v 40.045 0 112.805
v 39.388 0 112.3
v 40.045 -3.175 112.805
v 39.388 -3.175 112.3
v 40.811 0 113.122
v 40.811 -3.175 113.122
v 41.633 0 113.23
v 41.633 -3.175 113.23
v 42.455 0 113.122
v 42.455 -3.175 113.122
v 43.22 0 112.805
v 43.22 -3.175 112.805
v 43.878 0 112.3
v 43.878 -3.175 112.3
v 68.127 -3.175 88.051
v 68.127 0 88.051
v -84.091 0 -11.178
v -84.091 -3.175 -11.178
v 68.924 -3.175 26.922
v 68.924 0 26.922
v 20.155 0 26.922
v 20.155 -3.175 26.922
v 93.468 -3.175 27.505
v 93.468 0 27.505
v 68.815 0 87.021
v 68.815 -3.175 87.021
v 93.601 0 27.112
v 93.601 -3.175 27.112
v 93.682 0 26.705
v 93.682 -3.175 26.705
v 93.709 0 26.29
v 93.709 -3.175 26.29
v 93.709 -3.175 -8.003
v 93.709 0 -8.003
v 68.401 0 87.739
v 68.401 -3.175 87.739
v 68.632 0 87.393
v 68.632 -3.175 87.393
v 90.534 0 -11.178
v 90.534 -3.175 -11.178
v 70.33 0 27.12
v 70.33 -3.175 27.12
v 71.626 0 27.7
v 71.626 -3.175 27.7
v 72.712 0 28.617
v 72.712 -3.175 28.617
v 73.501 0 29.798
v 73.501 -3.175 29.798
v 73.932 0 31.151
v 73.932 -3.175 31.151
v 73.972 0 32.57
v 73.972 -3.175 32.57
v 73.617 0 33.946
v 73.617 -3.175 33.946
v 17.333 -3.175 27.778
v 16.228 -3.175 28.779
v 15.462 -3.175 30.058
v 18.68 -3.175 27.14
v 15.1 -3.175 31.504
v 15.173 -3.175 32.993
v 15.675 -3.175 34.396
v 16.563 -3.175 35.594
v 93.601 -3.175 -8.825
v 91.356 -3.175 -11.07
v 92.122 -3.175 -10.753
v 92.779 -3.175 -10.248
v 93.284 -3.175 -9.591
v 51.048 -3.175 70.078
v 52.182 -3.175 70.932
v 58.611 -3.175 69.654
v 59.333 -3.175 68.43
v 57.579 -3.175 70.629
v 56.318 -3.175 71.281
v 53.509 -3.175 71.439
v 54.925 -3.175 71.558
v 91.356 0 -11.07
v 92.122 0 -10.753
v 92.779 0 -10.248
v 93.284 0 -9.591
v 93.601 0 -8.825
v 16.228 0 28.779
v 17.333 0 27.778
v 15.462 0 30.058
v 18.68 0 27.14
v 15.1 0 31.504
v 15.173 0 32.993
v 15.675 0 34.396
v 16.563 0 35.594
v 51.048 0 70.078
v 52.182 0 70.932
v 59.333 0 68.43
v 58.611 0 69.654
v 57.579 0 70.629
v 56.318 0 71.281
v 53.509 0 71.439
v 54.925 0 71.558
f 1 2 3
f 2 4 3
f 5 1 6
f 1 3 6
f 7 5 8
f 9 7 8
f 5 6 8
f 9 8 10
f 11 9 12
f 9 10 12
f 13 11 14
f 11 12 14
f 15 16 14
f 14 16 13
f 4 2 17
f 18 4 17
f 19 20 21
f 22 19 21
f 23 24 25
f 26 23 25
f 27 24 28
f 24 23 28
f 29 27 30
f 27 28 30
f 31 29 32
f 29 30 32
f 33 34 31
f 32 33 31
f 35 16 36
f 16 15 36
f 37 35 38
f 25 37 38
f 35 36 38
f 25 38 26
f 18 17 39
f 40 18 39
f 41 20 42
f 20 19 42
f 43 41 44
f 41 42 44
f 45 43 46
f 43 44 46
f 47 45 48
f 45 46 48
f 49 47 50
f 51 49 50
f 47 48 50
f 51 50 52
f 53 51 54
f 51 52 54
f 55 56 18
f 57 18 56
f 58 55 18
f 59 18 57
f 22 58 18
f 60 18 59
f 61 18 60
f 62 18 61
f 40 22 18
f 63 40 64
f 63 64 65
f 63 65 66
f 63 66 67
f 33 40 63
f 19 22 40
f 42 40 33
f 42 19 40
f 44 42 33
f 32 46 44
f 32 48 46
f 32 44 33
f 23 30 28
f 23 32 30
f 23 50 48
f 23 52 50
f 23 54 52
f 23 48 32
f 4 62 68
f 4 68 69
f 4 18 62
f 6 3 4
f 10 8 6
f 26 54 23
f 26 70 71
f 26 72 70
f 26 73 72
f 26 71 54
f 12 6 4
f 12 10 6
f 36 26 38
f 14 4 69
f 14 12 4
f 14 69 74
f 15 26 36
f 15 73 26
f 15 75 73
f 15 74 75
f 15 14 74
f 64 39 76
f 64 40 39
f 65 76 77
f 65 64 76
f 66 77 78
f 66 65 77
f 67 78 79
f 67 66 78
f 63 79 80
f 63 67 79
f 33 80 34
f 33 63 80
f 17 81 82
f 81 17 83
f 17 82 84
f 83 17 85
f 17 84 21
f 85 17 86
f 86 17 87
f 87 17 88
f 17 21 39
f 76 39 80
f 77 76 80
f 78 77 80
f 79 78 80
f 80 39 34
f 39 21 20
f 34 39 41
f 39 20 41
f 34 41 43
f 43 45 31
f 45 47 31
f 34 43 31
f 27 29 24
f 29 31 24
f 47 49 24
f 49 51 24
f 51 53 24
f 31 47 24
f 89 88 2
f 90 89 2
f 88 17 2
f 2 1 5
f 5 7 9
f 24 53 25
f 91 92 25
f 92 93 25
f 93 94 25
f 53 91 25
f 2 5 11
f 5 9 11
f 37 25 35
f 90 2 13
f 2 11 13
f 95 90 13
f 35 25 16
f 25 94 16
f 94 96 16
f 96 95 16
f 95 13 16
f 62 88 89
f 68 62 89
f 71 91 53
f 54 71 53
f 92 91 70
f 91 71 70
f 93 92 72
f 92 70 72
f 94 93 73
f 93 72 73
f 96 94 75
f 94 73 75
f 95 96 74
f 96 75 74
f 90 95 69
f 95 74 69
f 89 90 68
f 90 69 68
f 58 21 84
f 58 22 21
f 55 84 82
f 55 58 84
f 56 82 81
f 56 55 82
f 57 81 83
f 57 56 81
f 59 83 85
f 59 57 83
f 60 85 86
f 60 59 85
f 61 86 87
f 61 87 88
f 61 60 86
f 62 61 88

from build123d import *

# Parameters (mm, degrees)
F1_DEPTH = 3.175
F2_R     = 5.08
F3_R     = 3.175


with BuildPart() as f1:
    # F0 (on Front) → F1 (new body)
    with BuildSketch(Plane.XZ):
        Polygon((41.632985, 114.545227), (-84.090601, -11.178358), (93.709399, -11.178358), (93.709399, 26.921642), (68.573753, 87.604459), align=None)
        Polygon((7.890936, 26.921642), (56.423554, 75.45426), (76.526423, 26.921642), align=None, mode=Mode.SUBTRACT)
    extrude(amount=F1_DEPTH)

    # F2
    f2_edges = [f1.edges().sort_by_distance(p)[0] for p in [
        (7.890936, -1.5875, 26.921642),
        (76.526423, -1.5875, 26.921642),
        (56.423554, -1.5875, 75.45426),
    ]]
    fillet(f2_edges, radius=F2_R)

    # F3
    f3_edges = [f1.edges().sort_by_distance(p)[0] for p in [
        (41.632985, -1.5875, 114.545227),
        (68.573753, -1.5875, 87.604459),
        (93.709399, -1.5875, 26.921642),
        (93.709399, -1.5875, -11.178358),
    ]]
    fillet(f3_edges, radius=F3_R)


solid = f1.part
